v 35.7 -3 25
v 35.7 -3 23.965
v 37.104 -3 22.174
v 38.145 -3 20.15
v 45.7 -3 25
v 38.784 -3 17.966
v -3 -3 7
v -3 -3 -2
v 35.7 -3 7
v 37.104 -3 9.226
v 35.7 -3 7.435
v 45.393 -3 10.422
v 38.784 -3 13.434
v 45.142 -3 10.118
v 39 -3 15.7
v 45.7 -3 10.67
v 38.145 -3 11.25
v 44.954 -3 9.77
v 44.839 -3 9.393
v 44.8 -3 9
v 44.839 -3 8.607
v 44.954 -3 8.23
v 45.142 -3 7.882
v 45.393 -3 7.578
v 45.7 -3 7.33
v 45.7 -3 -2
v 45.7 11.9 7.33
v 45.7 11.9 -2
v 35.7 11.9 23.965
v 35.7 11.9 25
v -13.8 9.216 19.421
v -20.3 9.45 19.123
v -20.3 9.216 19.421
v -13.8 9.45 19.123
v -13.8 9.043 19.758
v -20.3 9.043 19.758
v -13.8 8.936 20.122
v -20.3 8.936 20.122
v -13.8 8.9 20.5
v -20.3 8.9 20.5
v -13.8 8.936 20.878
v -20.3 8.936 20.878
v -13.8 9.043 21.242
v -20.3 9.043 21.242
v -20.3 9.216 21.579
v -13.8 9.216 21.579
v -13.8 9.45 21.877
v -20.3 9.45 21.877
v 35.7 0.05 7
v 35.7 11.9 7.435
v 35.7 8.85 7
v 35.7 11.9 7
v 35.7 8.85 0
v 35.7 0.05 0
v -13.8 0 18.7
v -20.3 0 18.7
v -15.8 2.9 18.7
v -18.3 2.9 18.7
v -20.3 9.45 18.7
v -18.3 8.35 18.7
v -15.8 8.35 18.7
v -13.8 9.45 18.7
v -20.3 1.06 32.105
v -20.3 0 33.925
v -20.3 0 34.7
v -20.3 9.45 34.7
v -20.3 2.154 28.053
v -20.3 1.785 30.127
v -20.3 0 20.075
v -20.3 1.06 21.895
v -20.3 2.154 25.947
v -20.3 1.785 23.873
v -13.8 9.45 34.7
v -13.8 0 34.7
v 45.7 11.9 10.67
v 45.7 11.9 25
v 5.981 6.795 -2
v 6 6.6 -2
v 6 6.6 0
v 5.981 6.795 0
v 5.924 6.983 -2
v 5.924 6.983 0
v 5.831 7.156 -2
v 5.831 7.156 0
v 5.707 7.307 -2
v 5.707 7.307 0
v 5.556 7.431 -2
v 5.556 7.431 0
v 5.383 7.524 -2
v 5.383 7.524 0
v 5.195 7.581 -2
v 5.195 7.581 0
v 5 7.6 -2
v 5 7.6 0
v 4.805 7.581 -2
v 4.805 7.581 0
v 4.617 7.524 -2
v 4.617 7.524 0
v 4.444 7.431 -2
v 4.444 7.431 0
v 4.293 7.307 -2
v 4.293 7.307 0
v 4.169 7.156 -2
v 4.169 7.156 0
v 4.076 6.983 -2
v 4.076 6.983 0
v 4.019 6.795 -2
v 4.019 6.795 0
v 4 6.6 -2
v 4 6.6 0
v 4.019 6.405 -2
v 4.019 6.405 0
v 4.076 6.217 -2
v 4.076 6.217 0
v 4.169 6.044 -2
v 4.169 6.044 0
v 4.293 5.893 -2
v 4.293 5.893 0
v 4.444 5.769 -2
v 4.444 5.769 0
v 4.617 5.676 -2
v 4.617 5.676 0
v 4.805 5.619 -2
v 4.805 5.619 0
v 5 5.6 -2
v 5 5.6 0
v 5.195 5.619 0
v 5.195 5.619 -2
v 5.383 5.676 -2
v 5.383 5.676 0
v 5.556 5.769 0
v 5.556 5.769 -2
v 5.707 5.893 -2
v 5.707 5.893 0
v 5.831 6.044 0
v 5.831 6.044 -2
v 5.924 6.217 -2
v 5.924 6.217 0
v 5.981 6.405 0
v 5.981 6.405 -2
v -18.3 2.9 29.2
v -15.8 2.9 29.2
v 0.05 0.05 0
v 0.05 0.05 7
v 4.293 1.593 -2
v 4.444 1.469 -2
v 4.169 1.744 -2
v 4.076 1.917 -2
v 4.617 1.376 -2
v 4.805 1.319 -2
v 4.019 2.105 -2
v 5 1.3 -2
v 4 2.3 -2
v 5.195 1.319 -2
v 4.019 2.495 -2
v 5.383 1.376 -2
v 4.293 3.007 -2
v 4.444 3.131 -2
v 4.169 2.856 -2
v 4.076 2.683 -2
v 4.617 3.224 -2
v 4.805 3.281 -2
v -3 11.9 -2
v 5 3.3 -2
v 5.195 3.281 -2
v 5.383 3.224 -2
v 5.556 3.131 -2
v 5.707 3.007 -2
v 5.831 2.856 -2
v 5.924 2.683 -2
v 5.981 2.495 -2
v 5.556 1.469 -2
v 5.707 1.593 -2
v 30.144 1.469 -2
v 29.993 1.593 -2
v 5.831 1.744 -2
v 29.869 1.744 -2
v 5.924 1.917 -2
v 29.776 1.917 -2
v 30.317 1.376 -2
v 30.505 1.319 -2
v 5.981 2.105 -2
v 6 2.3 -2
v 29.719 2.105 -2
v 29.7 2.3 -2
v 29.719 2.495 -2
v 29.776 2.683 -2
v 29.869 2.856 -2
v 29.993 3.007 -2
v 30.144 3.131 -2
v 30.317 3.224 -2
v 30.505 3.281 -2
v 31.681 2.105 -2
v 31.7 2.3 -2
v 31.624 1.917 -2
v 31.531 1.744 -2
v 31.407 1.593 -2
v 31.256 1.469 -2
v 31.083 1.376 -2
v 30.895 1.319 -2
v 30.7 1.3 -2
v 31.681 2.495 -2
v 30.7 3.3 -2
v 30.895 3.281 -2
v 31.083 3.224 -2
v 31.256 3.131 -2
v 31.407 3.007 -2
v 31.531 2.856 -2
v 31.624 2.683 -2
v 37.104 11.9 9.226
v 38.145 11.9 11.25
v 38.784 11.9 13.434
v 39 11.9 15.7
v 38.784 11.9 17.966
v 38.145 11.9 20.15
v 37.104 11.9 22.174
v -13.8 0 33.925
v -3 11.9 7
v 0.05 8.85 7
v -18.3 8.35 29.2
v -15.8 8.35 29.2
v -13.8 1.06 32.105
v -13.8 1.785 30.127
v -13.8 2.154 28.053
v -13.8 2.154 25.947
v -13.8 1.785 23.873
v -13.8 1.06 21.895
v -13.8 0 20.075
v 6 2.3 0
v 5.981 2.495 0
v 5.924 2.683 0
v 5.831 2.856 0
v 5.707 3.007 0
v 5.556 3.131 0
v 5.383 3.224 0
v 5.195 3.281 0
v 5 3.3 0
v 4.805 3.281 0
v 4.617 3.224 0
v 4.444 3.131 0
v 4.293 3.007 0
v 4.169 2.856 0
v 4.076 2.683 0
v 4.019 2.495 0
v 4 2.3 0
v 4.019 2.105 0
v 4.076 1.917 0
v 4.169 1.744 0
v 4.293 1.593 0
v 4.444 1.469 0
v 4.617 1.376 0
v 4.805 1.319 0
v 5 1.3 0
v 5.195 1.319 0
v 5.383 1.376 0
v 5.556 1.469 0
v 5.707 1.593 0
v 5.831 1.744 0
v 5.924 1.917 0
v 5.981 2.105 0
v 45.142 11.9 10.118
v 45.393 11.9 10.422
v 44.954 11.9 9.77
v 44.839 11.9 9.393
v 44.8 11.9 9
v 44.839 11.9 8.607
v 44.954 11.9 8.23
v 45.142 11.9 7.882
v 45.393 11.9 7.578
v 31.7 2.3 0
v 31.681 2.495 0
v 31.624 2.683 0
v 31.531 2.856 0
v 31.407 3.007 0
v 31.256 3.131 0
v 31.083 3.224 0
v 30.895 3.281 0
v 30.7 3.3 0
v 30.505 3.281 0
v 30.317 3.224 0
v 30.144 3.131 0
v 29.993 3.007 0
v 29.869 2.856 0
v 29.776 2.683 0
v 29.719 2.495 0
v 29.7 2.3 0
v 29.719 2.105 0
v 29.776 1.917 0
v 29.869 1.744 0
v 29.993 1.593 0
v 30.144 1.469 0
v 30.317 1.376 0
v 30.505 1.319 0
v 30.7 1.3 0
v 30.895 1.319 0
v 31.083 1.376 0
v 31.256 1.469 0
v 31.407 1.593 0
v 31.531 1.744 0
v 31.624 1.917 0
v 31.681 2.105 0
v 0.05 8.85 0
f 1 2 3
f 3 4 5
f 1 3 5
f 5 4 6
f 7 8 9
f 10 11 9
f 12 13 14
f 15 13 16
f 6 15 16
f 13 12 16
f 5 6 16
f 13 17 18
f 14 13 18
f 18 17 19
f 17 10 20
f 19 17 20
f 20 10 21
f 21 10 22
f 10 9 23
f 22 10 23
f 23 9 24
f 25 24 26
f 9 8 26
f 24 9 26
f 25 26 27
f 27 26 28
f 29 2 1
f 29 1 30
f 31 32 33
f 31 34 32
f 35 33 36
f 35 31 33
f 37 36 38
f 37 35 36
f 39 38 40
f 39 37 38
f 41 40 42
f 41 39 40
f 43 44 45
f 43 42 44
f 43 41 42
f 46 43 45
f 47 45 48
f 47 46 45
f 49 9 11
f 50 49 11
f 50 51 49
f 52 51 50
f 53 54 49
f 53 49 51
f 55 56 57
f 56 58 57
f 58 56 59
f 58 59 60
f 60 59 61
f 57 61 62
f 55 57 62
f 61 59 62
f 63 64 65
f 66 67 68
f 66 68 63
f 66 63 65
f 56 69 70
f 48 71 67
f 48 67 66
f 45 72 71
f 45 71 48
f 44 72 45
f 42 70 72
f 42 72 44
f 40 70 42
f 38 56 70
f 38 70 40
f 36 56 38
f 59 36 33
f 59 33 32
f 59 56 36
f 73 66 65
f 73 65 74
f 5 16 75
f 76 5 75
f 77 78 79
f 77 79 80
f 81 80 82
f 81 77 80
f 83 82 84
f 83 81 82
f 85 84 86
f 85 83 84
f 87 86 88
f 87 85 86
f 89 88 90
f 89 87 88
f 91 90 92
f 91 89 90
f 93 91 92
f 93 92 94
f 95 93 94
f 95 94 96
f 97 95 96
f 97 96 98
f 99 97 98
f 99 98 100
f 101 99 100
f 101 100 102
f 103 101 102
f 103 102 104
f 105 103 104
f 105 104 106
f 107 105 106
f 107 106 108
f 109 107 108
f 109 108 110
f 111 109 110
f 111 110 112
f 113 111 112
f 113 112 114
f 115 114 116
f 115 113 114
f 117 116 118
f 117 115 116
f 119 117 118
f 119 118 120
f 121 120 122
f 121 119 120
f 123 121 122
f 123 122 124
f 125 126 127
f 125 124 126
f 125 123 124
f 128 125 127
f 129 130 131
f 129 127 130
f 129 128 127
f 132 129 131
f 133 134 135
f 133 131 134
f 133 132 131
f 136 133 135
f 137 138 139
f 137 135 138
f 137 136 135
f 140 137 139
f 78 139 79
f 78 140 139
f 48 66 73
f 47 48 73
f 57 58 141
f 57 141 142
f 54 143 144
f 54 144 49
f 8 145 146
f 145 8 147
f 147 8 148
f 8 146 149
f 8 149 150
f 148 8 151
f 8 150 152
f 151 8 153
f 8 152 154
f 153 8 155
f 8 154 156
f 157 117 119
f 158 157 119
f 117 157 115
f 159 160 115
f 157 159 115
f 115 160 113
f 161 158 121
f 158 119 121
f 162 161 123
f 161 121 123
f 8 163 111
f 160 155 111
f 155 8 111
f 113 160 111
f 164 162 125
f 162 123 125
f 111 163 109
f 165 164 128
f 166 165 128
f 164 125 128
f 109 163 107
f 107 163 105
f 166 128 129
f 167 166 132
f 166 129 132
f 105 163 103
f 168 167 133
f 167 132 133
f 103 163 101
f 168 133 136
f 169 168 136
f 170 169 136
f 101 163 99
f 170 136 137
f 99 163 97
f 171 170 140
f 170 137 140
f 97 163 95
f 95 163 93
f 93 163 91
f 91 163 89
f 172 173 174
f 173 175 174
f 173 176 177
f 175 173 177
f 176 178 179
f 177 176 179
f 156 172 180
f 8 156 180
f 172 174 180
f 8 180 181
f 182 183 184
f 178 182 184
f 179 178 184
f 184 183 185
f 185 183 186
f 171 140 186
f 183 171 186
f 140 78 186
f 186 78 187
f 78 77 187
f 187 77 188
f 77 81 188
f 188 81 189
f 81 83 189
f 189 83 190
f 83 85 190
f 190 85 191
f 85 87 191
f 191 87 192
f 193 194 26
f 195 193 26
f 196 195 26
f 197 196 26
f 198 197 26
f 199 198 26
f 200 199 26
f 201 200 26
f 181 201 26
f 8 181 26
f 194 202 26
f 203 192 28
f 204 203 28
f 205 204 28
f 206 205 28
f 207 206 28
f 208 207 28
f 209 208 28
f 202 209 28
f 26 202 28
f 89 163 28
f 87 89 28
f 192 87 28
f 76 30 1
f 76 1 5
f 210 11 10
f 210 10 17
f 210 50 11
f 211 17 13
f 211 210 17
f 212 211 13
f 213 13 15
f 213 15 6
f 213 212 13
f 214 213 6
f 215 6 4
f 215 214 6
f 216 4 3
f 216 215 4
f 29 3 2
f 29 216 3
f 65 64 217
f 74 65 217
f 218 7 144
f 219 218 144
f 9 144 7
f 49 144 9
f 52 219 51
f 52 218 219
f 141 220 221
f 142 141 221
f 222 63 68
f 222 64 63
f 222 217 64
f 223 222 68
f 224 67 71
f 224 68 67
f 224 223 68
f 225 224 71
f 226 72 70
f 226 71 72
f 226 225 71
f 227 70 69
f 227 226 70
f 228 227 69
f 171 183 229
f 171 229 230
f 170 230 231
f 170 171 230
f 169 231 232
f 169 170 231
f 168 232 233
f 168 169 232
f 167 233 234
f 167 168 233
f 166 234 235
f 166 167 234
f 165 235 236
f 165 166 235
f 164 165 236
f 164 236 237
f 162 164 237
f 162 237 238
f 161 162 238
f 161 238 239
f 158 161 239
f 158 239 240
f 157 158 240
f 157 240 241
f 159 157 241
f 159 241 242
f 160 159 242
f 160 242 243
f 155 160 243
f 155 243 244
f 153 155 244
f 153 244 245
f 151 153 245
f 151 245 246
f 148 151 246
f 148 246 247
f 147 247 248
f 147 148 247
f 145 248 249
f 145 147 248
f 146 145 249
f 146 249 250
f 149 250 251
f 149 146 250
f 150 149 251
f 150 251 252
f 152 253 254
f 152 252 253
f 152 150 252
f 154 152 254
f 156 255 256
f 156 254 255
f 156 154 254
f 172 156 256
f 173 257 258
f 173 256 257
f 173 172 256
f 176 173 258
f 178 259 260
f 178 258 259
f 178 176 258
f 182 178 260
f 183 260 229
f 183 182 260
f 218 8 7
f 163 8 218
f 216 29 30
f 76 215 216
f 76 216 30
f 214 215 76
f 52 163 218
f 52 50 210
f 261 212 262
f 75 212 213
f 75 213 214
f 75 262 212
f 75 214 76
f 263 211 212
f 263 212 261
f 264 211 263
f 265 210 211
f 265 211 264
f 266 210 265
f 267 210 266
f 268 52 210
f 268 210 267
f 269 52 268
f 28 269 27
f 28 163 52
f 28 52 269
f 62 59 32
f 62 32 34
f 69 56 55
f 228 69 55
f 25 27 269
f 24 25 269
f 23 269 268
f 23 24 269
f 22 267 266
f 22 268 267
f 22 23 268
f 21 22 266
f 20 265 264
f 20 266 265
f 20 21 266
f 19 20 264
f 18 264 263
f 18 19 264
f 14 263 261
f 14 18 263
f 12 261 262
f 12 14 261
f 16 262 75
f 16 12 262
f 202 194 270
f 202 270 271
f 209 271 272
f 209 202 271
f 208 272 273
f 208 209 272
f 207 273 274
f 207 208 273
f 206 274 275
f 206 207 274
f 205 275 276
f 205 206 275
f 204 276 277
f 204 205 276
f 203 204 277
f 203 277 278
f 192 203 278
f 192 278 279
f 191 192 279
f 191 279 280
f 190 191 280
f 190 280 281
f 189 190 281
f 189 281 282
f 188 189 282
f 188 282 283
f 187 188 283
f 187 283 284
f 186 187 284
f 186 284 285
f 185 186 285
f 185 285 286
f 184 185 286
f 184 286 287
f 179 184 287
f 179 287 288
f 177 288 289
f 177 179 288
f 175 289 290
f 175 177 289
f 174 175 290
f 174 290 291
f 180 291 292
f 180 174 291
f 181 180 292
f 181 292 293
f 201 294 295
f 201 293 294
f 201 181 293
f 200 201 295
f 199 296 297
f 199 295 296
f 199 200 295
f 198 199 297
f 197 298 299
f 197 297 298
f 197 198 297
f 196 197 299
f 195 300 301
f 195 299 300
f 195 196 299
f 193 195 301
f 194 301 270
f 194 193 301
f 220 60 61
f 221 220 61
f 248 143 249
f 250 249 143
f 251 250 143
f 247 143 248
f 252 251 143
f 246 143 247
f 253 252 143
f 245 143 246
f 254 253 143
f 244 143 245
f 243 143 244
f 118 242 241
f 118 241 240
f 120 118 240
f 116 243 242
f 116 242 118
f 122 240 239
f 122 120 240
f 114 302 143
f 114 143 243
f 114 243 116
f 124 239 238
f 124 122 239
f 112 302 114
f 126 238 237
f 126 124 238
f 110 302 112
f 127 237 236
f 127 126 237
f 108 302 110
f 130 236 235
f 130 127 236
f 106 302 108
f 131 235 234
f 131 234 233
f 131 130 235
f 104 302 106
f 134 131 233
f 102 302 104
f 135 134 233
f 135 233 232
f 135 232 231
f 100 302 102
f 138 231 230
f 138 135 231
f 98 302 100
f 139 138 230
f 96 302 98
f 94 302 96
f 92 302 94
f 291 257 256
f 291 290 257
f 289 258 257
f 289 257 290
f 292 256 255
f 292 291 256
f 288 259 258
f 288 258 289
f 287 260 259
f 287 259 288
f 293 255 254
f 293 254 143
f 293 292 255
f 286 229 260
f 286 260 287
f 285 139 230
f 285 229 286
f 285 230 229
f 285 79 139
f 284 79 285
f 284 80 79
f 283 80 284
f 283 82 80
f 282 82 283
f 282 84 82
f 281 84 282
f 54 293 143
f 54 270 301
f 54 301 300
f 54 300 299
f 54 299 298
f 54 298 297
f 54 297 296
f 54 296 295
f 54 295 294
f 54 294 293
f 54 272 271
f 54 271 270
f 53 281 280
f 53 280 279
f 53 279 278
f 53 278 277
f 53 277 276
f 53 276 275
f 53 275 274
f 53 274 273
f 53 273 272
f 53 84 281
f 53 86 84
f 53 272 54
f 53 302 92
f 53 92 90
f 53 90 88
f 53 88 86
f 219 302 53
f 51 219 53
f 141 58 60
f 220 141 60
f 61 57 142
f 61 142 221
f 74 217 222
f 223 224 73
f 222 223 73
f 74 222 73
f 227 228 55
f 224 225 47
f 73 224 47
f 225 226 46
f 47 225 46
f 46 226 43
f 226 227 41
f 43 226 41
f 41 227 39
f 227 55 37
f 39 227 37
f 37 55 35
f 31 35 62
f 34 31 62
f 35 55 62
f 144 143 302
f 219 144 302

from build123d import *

# Parameters (mm, degrees)
CYLINDER002_R     = 1
CYLINDER002_DEPTH = 10
CYLINDER003_R     = 1
CYLINDER003_DEPTH = 10
CYLINDER_R        = 1
CYLINDER_DEPTH    = 10
CYLINDER005_R     = 2
CYLINDER005_DEPTH = 16
CYLINDER004_R     = 12
CYLINDER004_DEPTH = 20
BOX005_W          = 10
BOX005_H          = 14.9
BOX005_DEPTH      = 27
BOX004_W          = 45.7
BOX004_H          = 14.9
BOX004_DEPTH      = 2
BOX_W             = 36.6
BOX_H             = 8.8
BOX_DEPTH         = 10
BOX001_W          = 45.7
BOX001_H          = 14.9
BOX001_DEPTH      = 7
CYLINDER007_R     = 2
CYLINDER007_DEPTH = 10
CYLINDER006_R     = 12
CYLINDER006_DEPTH = 16
BOX007_W          = 2.5
BOX007_H          = 5.45
BOX007_DEPTH      = 10.5
BOX008_W          = 6.5
BOX008_H          = 9.45
BOX008_DEPTH      = 16


with BuildPart() as cylinder002:
    # Cylinder002 → Cylinder002 (new body)
    with BuildSketch(Plane(origin=(5, 6.6, -4), x_dir=(1, 0, 0), z_dir=(0, 0, 1))):
        Circle(CYLINDER002_R)
    extrude(amount=CYLINDER002_DEPTH)


with BuildPart() as cylinder003:
    # Cylinder003 → Cylinder003 (new body)
    with BuildSketch(Plane(origin=(30.7, 2.3, -4), x_dir=(1, 0, 0), z_dir=(0, 0, 1))):
        Circle(CYLINDER003_R)
    extrude(amount=CYLINDER003_DEPTH)


with BuildPart() as fusion:
    # Cylinder → Cylinder (new body)
    with BuildSketch(Plane(origin=(5, 2.3, -4), x_dir=(1, 0, 0), z_dir=(0, 0, 1))):
        Circle(CYLINDER_R)
    extrude(amount=CYLINDER_DEPTH)

    # Fusion: union Cylinder002, Cylinder003
    add(cylinder002.part)
    add(cylinder003.part)


with BuildPart() as cylinder005:
    # Cylinder005 → Cylinder005 (new body)
    with BuildSketch(Plane(origin=(46.8, -3.5, 9), x_dir=(1, 0, 0), z_dir=(0, 1, 0))):
        Circle(CYLINDER005_R)
    extrude(amount=CYLINDER005_DEPTH)


with BuildPart() as cylinder004:
    # Cylinder004 → Cylinder004 (new body)
    with BuildSketch(Plane(origin=(27, 14, 15.7), x_dir=(1, 0, 0), z_dir=(0, -1, 0))):
        Circle(CYLINDER004_R)
    extrude(amount=CYLINDER004_DEPTH)


with BuildPart() as cut002:
    # Box005 → Box005 (new body)
    with BuildSketch(Plane(origin=(35.7, -3, -2), x_dir=(1, 0, 0), z_dir=(0, 0, 1))):
        with Locations((5, 7.45)):
            Rectangle(BOX005_W, BOX005_H)
    extrude(amount=BOX005_DEPTH)

    # Cut001: cut Cylinder004
    add(cylinder004.part, mode=Mode.SUBTRACT)

    # Cut002: cut Cylinder005
    add(cylinder005.part, mode=Mode.SUBTRACT)


with BuildPart() as cube004:
    # Box004 → Box004 (new body)
    with BuildSketch(Plane(origin=(-3, -3, -2), x_dir=(1, 0, 0), z_dir=(0, 0, 1))):
        with Locations((22.85, 7.45)):
            Rectangle(BOX004_W, BOX004_H)
    extrude(amount=BOX004_DEPTH)


with BuildPart() as cube:
    # Box → Box (new body)
    with BuildSketch(Plane(origin=(0.05, 0.05, -2), x_dir=(1, 0, 0), z_dir=(0, 0, 1))):
        with Locations((18.3, 4.4)):
            Rectangle(BOX_W, BOX_H)
    extrude(amount=BOX_DEPTH)


with BuildPart() as cut003:
    # Box001 → Box001 (new body)
    with BuildSketch(Plane(origin=(-3, -3, 0), x_dir=(1, 0, 0), z_dir=(0, 0, 1))):
        with Locations((22.85, 7.45)):
            Rectangle(BOX001_W, BOX001_H)
    extrude(amount=BOX001_DEPTH)

    # Cut: cut Cube
    add(cube.part, mode=Mode.SUBTRACT)

    # Fusion001: union Cut002, Cube004
    add(cut002.part)
    add(cube004.part)

    # Cut003: cut Fusion
    add(fusion.part, mode=Mode.SUBTRACT)


with BuildPart() as cylinder007:
    # Cylinder007 → Cylinder007 (new body)
    with BuildSketch(Plane(origin=(-12, 10.9, 20.5), x_dir=(0, 0, 1), z_dir=(-1, 0, 0))):
        Circle(CYLINDER007_R)
    extrude(amount=CYLINDER007_DEPTH)


with BuildPart() as cylinder006:
    # Cylinder006 → Cylinder006 (new body)
    with BuildSketch(Plane(origin=(-10, -9.8, 27), x_dir=(0, 0, 1), z_dir=(-1, 0, 0))):
        Circle(CYLINDER006_R)
    extrude(amount=CYLINDER006_DEPTH)


with BuildPart() as cube007:
    # Box007 → Box007 (new body)
    with BuildSketch(Plane(origin=(-18.3, 2.9, 18.7), x_dir=(1, 0, 0), z_dir=(0, 0, 1))):
        with Locations((1.25, 2.725)):
            Rectangle(BOX007_W, BOX007_H)
    extrude(amount=BOX007_DEPTH)


with BuildPart() as cut006:
    # Box008 → Box008 (new body)
    with BuildSketch(Plane(origin=(-20.3, 0, 18.7), x_dir=(1, 0, 0), z_dir=(0, 0, 1))):
        with Locations((3.25, 4.725)):
            Rectangle(BOX008_W, BOX008_H)
    extrude(amount=BOX008_DEPTH)

    # Cut004: cut Cube007
    add(cube007.part, mode=Mode.SUBTRACT)

    # Cut005: cut Cylinder006
    add(cylinder006.part, mode=Mode.SUBTRACT)

    # Cut006: cut Cylinder007
    add(cylinder007.part, mode=Mode.SUBTRACT)


solid = Compound([cut003.part, cut006.part])
